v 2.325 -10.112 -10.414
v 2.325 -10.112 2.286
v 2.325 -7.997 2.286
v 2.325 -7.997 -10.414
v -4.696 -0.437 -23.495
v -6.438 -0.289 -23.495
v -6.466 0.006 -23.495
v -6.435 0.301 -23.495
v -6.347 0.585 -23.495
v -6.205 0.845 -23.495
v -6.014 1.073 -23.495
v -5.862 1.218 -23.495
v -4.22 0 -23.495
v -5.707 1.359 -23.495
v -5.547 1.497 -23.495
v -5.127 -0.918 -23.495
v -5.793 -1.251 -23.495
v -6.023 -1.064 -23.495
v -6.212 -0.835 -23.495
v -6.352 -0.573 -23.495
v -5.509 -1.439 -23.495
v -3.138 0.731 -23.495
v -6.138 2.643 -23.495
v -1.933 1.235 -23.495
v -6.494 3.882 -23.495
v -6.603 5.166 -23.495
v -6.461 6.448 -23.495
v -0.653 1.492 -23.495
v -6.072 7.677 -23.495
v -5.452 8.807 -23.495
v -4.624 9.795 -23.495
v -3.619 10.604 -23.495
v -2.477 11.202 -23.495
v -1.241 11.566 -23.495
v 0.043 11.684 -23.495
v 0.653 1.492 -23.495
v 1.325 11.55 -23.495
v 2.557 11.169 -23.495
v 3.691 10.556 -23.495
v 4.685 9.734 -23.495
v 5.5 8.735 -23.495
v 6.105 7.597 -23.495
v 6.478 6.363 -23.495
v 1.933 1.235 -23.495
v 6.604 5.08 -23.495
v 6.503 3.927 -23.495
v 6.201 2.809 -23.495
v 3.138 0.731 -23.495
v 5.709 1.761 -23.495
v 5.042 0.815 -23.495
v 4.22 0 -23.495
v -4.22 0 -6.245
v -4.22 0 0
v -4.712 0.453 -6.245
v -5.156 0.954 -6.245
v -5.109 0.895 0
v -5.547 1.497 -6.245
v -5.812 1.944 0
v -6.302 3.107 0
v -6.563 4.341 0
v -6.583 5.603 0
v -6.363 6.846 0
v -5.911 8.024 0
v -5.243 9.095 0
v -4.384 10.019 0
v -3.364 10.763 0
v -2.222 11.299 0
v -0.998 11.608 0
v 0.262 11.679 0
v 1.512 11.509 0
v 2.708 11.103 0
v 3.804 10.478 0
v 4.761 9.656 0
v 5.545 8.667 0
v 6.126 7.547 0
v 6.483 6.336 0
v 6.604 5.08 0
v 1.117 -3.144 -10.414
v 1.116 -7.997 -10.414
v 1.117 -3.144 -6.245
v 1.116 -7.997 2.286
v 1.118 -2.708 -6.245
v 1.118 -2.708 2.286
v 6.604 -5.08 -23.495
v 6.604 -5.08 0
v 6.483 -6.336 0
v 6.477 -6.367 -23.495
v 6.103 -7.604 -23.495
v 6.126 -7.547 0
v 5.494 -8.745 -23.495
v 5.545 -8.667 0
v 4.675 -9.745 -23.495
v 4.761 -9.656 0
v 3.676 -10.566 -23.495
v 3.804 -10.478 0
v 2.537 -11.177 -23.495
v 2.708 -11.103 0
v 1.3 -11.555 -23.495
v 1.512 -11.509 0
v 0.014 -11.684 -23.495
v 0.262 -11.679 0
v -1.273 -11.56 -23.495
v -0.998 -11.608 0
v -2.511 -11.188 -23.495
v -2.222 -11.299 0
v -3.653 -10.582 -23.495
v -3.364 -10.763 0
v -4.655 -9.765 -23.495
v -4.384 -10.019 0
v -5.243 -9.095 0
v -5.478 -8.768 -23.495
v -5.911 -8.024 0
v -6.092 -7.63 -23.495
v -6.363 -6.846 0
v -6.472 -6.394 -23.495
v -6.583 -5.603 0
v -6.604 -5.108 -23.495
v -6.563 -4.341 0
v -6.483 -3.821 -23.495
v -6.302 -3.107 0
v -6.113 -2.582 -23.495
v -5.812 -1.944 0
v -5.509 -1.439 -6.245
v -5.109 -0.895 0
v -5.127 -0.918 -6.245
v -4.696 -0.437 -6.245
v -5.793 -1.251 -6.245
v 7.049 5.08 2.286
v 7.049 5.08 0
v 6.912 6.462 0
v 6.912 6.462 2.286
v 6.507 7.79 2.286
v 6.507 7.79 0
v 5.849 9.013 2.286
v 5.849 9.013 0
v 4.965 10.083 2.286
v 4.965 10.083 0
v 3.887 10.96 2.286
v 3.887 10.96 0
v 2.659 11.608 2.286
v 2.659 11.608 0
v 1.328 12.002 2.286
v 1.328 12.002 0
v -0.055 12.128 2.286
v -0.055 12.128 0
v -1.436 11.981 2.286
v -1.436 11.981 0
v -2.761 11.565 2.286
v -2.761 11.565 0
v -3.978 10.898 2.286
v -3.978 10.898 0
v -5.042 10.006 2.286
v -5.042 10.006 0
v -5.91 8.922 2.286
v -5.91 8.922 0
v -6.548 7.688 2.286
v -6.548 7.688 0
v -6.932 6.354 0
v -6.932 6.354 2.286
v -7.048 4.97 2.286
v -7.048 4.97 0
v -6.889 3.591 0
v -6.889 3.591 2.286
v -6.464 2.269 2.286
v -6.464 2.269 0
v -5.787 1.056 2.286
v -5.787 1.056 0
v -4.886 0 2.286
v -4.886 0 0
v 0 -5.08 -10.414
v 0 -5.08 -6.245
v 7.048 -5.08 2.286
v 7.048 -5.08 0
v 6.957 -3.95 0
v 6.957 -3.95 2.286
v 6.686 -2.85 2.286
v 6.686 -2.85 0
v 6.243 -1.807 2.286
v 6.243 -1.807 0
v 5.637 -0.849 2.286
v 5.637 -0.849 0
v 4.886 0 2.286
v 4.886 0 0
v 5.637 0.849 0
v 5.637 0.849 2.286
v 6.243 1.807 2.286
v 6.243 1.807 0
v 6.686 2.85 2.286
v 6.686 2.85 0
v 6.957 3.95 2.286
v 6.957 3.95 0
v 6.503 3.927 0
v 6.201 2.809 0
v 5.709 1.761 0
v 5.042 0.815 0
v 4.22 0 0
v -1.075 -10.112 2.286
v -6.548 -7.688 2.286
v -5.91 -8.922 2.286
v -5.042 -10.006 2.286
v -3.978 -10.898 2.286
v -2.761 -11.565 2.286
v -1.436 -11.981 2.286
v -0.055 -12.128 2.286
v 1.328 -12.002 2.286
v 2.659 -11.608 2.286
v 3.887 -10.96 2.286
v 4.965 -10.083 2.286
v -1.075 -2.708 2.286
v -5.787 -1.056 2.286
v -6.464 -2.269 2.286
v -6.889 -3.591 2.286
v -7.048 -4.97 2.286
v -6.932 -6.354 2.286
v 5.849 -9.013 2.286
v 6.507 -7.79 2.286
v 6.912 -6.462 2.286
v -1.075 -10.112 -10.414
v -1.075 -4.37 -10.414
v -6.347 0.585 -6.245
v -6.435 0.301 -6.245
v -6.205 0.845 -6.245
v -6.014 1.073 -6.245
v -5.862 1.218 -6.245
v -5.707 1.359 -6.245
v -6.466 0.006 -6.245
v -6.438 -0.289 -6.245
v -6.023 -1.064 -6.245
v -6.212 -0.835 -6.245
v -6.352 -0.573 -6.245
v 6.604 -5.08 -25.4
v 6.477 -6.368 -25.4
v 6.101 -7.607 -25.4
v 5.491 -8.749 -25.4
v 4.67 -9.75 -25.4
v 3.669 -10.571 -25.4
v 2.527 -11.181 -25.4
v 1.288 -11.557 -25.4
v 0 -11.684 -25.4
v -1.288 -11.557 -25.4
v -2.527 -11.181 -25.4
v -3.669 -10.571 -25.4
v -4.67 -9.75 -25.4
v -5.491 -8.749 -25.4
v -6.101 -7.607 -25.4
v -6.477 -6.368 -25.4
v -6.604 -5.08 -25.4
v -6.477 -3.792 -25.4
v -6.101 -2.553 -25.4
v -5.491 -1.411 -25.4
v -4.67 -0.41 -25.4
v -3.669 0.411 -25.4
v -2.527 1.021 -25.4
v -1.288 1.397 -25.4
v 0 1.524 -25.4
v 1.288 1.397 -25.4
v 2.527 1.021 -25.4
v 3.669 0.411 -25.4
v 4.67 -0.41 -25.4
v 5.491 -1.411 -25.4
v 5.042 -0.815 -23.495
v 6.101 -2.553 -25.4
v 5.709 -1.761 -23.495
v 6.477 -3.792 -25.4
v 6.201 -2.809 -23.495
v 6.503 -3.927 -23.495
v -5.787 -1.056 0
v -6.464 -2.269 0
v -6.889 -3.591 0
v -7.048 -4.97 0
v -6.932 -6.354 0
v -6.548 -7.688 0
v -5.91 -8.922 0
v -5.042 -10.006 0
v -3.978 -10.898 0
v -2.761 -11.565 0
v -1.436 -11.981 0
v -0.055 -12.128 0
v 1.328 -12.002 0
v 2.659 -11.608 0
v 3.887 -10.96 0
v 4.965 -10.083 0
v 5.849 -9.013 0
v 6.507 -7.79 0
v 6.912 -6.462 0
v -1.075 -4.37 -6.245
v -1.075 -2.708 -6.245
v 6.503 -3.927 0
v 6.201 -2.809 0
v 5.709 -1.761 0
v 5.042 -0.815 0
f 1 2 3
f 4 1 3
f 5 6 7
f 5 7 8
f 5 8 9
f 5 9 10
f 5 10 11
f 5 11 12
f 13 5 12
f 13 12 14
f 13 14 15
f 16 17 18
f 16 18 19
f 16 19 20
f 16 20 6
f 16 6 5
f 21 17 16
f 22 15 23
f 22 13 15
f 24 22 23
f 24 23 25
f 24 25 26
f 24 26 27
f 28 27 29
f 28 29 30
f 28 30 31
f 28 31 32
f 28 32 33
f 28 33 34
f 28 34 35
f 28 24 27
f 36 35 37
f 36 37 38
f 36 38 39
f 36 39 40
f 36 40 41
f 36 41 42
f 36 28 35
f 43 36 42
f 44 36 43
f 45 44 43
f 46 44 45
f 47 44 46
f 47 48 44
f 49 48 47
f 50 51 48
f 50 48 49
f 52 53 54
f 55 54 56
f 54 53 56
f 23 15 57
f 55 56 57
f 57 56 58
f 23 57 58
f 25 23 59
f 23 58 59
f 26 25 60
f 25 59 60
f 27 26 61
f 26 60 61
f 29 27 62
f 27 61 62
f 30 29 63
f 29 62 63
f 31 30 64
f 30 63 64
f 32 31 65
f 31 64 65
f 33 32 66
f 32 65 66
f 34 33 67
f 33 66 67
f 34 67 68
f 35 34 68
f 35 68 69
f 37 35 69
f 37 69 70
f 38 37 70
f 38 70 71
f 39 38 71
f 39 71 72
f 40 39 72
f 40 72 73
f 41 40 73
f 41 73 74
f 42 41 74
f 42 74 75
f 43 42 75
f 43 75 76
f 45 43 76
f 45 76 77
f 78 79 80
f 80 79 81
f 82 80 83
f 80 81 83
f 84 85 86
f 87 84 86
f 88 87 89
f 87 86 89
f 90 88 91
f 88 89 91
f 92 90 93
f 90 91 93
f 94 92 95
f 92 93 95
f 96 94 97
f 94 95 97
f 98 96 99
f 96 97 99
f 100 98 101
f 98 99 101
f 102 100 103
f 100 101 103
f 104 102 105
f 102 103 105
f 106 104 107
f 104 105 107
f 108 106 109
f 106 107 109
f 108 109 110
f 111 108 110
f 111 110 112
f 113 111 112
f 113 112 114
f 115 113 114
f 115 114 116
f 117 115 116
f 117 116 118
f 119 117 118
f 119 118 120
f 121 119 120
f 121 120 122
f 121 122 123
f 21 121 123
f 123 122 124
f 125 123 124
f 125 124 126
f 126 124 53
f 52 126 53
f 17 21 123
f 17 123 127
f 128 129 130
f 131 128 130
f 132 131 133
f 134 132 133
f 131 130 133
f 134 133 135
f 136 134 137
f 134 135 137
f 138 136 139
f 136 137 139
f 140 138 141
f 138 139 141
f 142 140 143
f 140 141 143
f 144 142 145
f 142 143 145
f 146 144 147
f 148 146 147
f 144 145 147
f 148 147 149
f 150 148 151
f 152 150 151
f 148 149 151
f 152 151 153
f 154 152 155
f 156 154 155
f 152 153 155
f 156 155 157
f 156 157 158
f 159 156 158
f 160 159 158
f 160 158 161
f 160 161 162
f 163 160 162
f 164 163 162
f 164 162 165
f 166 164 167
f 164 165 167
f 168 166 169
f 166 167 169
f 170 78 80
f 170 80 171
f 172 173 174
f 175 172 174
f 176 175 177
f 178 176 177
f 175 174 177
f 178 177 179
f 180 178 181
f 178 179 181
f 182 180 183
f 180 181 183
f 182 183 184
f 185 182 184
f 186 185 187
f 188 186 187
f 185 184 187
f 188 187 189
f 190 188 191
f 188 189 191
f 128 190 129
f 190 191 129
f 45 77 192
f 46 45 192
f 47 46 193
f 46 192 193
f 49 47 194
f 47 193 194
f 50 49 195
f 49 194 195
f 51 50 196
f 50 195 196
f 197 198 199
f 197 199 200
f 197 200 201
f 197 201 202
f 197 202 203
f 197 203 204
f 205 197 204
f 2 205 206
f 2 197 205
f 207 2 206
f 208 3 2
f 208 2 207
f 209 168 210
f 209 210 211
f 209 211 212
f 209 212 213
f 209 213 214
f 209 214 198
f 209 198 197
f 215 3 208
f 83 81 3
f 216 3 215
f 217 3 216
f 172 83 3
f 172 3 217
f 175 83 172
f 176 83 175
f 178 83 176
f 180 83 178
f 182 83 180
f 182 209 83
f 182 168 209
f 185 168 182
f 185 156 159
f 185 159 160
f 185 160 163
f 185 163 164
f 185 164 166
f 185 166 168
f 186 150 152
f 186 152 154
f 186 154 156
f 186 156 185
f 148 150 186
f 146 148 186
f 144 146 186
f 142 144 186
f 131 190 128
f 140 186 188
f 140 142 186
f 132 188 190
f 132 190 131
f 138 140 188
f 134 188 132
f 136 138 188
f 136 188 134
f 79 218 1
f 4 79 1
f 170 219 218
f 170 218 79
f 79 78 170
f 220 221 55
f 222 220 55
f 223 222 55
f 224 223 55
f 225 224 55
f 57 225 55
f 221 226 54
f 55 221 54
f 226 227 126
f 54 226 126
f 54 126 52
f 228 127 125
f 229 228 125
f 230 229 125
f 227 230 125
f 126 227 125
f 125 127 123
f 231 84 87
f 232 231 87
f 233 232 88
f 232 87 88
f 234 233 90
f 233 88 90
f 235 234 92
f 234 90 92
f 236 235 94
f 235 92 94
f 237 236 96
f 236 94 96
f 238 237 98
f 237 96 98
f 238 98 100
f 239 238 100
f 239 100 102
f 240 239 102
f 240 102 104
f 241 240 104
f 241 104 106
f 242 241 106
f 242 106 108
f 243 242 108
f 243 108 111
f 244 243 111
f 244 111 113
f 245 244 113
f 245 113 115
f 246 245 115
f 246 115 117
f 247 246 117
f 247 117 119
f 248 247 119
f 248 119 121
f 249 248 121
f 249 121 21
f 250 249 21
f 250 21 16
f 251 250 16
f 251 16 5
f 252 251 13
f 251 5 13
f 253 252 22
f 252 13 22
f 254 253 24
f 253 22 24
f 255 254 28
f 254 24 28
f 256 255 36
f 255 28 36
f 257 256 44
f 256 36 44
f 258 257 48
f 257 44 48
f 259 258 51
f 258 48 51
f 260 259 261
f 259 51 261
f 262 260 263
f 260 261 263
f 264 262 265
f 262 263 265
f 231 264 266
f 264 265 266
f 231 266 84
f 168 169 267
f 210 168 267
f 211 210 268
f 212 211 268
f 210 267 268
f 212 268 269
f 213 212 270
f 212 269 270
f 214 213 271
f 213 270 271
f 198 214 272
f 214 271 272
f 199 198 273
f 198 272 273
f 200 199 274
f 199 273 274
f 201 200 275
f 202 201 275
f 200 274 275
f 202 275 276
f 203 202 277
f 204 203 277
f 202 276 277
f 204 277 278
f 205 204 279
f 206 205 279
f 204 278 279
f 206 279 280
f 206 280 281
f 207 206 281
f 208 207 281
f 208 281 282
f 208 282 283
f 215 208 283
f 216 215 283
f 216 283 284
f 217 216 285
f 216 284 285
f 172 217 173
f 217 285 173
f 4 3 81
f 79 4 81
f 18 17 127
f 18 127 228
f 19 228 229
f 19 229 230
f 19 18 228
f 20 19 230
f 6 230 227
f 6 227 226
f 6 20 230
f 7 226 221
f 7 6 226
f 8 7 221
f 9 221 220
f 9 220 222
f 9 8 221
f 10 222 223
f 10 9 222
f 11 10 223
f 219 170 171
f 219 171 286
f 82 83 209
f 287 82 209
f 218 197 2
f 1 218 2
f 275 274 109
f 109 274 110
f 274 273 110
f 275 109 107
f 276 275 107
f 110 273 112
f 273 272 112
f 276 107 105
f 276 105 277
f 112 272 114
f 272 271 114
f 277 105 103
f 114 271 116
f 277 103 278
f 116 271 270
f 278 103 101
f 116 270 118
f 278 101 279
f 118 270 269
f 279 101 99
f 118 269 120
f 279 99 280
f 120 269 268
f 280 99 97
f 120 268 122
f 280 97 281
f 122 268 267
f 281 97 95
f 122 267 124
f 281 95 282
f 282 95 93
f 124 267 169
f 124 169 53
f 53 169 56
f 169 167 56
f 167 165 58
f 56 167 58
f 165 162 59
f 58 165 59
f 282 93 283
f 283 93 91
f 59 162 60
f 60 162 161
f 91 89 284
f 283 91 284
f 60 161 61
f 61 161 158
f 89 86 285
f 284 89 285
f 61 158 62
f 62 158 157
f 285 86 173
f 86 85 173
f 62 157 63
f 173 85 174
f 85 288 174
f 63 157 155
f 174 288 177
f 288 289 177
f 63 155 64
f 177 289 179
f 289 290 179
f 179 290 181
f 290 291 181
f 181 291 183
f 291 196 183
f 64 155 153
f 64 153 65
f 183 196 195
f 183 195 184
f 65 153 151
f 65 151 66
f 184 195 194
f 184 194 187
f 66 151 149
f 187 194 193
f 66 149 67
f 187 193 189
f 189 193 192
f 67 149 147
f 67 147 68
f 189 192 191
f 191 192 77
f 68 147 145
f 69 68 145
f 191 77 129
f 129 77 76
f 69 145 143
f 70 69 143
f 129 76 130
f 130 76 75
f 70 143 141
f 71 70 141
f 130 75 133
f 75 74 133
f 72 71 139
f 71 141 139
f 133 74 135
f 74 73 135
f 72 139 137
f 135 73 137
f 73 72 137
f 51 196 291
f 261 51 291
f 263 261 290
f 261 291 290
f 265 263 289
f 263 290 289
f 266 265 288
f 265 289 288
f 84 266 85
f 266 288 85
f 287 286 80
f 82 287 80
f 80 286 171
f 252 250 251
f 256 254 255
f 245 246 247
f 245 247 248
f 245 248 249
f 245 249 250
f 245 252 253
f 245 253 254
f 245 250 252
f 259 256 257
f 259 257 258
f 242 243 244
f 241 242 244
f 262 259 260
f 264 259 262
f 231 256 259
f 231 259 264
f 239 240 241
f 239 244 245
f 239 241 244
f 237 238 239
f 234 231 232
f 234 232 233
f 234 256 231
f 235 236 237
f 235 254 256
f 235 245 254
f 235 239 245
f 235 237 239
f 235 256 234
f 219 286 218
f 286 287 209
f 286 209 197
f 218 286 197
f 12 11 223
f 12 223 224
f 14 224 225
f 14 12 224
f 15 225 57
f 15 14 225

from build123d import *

# Parameters (mm, degrees)
F1_DEPTH = 2.286
F3_DEPTH = 23.495
F5_DEPTH = 12.7
F6_R     = 6.604
F7_DEPTH = 1.905
F9_DEPTH = 17.25


with BuildPart() as f1:
    # F0 (on Top) → F1 (new body)
    with BuildSketch(Plane.XY):
        with BuildLine():
            ThreePointArc((4.8862001852, 0), (6.4854349991, 2.3194773824), (7.0485, 5.08))
            ThreePointArc((7.0485, 5.08), (-2.7605226176, 11.5654349991), (-4.8862001852, 0))
            ThreePointArc((-4.8862001852, 0), (0, 1.9685), (4.8862001852, 0))
        make_face()
        with BuildLine():
            ThreePointArc((4.8862001852, 0), (0, 1.9685), (-4.8862001852, 0))
            ThreePointArc((-4.8862001852, 0), (0, -1.9685), (4.8862001852, 0))
        make_face()
        with BuildLine():
            ThreePointArc((4.8862001852, 0), (0, -1.9685), (-4.8862001852, 0))
            ThreePointArc((-4.8862001852, 0), (-2.7605226176, -11.5654349991), (7.0485, -5.08))
            ThreePointArc((7.0485, -5.08), (6.4854349991, -2.3194773824), (4.8862001852, 0))
        make_face()
    extrude(amount=F1_DEPTH)

    # F2 (on face) → F3 (join)
    with BuildSketch(Plane(origin=(0, 0, 0), x_dir=(1, 0, 0), z_dir=(0, 0, -1))):
        with BuildLine():
            ThreePointArc((4.2197649224, 0), (5.9783000739, 2.2741589093), (6.604, 5.08))
            ThreePointArc((6.604, 5.08), (-2.8058410907, 11.0583000739), (-4.2197649224, 0))
            ThreePointArc((-4.2197649224, 0), (0, 1.524), (4.2197649224, 0))
        make_face()
        with BuildLine():
            ThreePointArc((4.2197649224, 0), (0, 1.524), (-4.2197649224, 0))
            ThreePointArc((-4.2197649224, 0), (0, -1.524), (4.2197649224, 0))
        make_face()
        with BuildLine():
            ThreePointArc((4.2197649224, 0), (0, -1.524), (-4.2197649224, 0))
            ThreePointArc((-4.2197649224, 0), (-2.8058410907, -11.0583000739), (6.604, -5.08))
            ThreePointArc((6.604, -5.08), (5.9783000739, -2.2741589093), (4.2197649224, 0))
        make_face()
    extrude(amount=F3_DEPTH)

    # F4 (on face) → F5 (cut)
    with BuildSketch(Plane.XY.offset(2.286)):
        Polygon((1.1175982522, -2.7082355227), (-1.0746682528, -2.7082355227), (-1.0746682528, -10.1121831685), (2.3251036182, -10.1121831685), (2.3251036182, -7.996769622), (1.1162960436, -7.996769622), align=None)
    extrude(amount=-F5_DEPTH, mode=Mode.SUBTRACT)

    # F6 (on face) → F7 (join)
    with BuildSketch(Plane(origin=(0, 0, -23.495), x_dir=(1, 0, 0), z_dir=(0, 0, -1))):
        with Locations((0, 5.08)):
            Circle(F6_R)
    extrude(amount=F7_DEPTH)

    # F8 (on face) → F9 (join)
    with BuildSketch(Plane(origin=(0, 0, -23.495), x_dir=(1, 0, 0), z_dir=(0, 0, -1))):
        with BuildLine():
            ThreePointArc((-5.7929773658, 1.2513933032), (-6.4591589625, 0.142315863), (-6.0144739499, -1.0726351351))
            ThreePointArc((-6.0144739499, -1.0726351351), (-1.0745990182, -3.4566300699), (4.302, -2.3712825742))
            Line((4.302, -2.3712825742), (0, 5.08))
            Line((0, 5.08), (-5.7929773658, 1.2513933032))
        make_face()
    extrude(amount=-F9_DEPTH)


solid = f1.part
